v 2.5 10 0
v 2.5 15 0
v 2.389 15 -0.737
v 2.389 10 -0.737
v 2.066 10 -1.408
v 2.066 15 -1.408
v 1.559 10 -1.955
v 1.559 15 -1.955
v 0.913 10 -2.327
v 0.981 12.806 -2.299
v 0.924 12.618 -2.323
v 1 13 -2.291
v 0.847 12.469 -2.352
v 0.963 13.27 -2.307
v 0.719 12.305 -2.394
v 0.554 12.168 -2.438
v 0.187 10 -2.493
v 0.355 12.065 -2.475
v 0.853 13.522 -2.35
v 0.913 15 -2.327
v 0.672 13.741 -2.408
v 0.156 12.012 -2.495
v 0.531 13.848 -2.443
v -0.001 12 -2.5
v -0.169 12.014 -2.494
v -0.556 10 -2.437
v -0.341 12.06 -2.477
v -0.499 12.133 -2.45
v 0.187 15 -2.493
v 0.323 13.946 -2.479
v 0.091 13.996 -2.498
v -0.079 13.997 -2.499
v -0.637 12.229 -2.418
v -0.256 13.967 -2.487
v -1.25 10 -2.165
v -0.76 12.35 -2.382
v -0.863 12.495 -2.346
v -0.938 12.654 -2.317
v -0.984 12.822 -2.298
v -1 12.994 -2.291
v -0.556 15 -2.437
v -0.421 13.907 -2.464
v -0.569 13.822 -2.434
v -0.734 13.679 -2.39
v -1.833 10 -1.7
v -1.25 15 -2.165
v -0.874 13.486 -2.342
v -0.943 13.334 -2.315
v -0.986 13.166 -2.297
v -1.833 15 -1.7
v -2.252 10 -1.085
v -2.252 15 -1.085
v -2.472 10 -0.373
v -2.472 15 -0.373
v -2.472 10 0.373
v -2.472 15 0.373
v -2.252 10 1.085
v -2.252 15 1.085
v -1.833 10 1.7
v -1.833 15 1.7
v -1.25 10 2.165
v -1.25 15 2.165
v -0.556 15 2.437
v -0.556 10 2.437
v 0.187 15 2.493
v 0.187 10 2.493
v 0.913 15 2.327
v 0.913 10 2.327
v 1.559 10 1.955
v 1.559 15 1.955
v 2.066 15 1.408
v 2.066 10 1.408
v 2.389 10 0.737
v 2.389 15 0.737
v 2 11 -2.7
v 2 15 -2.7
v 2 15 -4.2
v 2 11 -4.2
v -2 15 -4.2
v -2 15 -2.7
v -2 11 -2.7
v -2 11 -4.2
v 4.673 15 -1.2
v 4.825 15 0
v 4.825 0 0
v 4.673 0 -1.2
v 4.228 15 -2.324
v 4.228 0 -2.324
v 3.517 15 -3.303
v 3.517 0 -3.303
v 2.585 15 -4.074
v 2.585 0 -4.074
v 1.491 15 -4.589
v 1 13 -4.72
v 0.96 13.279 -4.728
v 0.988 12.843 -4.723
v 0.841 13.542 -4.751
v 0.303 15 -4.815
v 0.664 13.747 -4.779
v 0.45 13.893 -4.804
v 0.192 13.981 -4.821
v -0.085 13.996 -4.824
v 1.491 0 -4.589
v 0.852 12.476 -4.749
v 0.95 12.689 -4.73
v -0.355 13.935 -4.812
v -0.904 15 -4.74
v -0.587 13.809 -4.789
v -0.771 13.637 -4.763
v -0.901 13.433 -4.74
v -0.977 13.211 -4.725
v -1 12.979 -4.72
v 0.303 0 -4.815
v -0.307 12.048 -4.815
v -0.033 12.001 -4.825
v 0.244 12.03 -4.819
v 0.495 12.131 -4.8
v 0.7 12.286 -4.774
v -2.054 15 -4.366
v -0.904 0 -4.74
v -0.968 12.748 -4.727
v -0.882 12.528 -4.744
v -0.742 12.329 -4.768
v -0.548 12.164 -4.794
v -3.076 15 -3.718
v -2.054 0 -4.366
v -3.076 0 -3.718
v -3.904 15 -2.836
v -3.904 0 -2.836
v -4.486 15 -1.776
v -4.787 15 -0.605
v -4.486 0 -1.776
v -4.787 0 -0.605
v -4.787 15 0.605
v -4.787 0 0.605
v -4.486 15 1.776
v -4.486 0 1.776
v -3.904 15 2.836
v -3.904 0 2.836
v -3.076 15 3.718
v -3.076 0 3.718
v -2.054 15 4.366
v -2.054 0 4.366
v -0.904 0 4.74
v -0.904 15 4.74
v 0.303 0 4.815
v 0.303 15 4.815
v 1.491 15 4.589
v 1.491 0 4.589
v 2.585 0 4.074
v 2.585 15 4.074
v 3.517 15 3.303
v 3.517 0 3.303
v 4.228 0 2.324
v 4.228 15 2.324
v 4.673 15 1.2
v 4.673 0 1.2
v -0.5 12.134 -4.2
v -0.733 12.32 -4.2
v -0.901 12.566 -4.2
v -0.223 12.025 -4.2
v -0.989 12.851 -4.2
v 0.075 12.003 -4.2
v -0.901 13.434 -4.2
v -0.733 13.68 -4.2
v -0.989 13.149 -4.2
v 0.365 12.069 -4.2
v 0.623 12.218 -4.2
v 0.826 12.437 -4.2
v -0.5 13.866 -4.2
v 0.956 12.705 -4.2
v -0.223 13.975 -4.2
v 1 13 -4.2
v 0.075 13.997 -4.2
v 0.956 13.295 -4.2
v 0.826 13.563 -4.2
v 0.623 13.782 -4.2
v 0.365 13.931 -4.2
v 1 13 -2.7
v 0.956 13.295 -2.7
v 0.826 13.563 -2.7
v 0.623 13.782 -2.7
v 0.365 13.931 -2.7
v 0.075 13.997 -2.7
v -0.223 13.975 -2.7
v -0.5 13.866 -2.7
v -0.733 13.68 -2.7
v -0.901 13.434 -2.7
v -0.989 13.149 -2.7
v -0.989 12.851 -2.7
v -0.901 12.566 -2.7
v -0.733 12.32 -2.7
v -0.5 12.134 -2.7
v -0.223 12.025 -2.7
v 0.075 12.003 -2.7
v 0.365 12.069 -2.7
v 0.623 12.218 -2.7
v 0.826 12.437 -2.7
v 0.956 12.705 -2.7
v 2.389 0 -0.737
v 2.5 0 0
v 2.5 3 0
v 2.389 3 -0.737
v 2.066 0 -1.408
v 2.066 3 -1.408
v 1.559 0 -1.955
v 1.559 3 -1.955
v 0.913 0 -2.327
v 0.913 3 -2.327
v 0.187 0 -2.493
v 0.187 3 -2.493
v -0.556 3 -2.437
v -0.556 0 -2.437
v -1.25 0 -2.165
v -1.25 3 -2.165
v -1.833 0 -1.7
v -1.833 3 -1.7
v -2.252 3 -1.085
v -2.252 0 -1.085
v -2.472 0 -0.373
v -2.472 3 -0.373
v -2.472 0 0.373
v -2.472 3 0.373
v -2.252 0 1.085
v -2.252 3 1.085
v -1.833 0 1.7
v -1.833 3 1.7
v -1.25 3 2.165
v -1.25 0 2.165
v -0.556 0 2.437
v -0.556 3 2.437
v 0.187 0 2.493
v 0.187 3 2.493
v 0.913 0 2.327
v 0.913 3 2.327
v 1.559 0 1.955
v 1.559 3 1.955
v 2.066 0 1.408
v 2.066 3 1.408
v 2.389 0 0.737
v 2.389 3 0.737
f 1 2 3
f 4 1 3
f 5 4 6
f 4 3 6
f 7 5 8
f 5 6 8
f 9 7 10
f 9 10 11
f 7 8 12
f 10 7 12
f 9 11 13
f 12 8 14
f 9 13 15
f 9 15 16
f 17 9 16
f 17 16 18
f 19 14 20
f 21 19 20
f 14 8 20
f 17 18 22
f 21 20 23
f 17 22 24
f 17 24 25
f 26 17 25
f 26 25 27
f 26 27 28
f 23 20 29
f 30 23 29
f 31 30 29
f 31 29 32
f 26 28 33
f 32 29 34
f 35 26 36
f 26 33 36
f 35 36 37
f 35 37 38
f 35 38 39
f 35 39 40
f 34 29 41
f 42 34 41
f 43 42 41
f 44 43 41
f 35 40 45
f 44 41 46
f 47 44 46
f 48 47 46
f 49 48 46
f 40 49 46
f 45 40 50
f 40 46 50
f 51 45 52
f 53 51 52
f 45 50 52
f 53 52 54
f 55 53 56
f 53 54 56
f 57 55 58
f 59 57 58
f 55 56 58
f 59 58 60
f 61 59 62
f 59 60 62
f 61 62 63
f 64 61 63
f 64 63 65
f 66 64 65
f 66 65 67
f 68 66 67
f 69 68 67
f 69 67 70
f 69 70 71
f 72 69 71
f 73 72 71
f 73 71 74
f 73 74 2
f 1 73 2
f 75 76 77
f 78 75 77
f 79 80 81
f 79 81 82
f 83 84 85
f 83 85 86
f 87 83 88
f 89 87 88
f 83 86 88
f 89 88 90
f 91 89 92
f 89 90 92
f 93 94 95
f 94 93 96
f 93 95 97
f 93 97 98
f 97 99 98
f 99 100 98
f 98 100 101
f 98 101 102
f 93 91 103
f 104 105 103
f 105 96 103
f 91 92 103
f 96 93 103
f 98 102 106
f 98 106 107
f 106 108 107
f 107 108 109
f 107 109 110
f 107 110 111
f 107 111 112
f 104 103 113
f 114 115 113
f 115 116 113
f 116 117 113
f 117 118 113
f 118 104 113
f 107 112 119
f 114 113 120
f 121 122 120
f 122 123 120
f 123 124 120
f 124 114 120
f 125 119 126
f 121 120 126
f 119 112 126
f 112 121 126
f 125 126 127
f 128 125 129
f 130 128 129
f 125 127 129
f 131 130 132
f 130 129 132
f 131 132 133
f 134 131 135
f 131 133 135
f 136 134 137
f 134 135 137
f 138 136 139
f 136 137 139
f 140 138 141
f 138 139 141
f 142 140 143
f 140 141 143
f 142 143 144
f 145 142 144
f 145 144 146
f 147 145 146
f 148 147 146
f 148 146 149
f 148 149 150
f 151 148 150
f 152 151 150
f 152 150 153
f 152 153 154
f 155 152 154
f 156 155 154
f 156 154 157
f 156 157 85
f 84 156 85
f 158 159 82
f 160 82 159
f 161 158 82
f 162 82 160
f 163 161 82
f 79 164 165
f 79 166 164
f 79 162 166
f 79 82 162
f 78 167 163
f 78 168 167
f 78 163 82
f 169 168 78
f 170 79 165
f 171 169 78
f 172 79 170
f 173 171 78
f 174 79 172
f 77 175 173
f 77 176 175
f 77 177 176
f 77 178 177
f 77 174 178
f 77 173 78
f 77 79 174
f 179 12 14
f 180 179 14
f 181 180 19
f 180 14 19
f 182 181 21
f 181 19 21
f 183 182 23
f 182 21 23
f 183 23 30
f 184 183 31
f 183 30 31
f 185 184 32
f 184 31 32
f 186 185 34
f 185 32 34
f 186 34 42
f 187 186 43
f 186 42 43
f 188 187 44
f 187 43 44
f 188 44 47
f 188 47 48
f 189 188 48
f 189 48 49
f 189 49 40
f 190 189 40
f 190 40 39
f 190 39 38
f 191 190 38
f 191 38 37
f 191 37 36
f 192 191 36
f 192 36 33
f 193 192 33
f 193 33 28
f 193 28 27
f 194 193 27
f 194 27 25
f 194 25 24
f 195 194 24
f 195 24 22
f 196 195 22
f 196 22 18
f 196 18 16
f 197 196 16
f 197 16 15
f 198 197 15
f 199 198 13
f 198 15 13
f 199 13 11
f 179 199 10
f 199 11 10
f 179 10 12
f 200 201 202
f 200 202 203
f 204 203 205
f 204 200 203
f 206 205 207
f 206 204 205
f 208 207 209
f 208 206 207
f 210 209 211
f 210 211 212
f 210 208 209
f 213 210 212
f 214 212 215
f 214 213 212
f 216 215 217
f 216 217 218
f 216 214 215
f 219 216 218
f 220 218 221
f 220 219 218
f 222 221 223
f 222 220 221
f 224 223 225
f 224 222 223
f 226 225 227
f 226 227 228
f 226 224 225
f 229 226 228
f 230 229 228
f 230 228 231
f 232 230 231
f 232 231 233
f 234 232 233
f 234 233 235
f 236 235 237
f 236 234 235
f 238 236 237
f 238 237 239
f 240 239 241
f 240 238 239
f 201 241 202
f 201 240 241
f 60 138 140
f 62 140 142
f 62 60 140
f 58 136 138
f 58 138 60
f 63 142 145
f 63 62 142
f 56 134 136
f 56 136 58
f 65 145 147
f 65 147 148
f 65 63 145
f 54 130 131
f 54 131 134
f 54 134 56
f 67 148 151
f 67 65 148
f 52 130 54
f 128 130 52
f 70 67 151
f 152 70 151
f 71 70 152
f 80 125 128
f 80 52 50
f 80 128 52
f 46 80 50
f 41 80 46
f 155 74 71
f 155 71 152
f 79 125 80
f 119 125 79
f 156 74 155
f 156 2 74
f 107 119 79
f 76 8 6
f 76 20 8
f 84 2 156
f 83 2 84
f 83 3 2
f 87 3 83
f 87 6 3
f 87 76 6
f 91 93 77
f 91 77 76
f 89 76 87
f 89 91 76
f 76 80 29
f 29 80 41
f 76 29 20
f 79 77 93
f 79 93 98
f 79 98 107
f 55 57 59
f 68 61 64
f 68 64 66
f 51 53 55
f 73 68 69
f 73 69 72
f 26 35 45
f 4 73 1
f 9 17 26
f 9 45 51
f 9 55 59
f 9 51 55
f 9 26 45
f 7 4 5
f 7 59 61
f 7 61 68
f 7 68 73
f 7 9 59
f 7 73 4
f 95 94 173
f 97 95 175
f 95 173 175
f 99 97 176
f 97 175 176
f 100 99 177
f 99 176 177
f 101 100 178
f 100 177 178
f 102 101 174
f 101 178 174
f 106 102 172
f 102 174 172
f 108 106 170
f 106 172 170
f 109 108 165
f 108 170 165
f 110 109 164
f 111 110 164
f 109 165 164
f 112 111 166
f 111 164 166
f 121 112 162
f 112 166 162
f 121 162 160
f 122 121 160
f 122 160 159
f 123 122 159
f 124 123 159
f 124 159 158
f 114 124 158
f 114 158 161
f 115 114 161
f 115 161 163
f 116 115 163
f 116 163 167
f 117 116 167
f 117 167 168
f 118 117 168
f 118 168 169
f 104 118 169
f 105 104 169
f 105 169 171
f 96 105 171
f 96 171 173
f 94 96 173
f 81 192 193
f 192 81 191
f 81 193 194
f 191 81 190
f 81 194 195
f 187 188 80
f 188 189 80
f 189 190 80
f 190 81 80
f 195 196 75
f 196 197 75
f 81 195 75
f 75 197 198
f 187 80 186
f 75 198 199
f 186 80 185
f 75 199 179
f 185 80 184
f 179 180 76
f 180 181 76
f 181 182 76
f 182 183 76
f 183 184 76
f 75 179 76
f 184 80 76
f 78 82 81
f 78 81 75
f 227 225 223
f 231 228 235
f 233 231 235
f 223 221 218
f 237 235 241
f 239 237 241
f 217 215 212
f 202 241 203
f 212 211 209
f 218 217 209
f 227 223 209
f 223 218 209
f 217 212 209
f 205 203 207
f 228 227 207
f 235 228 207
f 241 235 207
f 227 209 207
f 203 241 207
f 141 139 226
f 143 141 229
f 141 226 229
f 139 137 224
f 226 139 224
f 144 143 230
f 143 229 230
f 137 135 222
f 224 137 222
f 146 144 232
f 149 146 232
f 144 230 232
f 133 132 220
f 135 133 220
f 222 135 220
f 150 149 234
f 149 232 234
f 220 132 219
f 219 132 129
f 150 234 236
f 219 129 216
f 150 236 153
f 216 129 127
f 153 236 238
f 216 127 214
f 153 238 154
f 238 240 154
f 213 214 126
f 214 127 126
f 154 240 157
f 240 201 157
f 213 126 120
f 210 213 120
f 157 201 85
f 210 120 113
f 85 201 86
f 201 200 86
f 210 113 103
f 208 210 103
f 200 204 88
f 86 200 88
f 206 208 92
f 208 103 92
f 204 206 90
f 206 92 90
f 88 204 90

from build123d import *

# Parameters (mm, degrees)
IZIM1_R               = 4.825
BOSS_EXTRUDE1_DEPTH   = 15
IZIM1_6_R             = 2.5
CUT_EXTRUDE1_DEPTH    = 3
SKETCH2_R             = 2.5
CUT_EXTRUDE2_DEPTH    = 5
SKETCH3_R             = 1
CUT_EXTRUDE3_DEPTH    = 5.825
IZIM2_W               = 4
IZIM2_H               = 1.5
KES_EKSTR_ZYON1_DEPTH = 4


with BuildPart() as part:
    # Çizim1 → Boss-Extrude1 (new body)
    with BuildSketch(Plane(origin=(0, 0, 0), x_dir=(1, 0, 0), z_dir=(0, 1, 0))):
        Circle(IZIM1_R)
    extrude(amount=BOSS_EXTRUDE1_DEPTH)

    # Çizim1<6> → Cut-Extrude1 (cut)
    with BuildSketch(Plane(origin=(0, 0, 0), x_dir=(1, 0, 0), z_dir=(0, 1, 0))):
        Circle(IZIM1_6_R)
    extrude(amount=CUT_EXTRUDE1_DEPTH, mode=Mode.SUBTRACT)

    # Sketch2 → Cut-Extrude2 (cut)
    with BuildSketch(Plane(origin=(0, 15, 0), x_dir=(1, 0, 0), z_dir=(0, 1, 0))):
        Circle(SKETCH2_R)
    extrude(amount=-CUT_EXTRUDE2_DEPTH, mode=Mode.SUBTRACT)

    # Sketch3 → Cut-Extrude3 (cut, through all)
    with BuildSketch(Plane.XY):
        with Locations((0, 13)):
            Circle(SKETCH3_R)
    extrude(amount=-CUT_EXTRUDE3_DEPTH, mode=Mode.SUBTRACT)

    # Çizim2 → Kes-Ekstrüzyon1 (cut)
    with BuildSketch(Plane(origin=(0, 15, 0), x_dir=(1, 0, 0), z_dir=(0, 1, 0))):
        with Locations((0, 3.45)):
            Rectangle(IZIM2_W, IZIM2_H)
    extrude(amount=-KES_EKSTR_ZYON1_DEPTH, mode=Mode.SUBTRACT)


solid = part.part
